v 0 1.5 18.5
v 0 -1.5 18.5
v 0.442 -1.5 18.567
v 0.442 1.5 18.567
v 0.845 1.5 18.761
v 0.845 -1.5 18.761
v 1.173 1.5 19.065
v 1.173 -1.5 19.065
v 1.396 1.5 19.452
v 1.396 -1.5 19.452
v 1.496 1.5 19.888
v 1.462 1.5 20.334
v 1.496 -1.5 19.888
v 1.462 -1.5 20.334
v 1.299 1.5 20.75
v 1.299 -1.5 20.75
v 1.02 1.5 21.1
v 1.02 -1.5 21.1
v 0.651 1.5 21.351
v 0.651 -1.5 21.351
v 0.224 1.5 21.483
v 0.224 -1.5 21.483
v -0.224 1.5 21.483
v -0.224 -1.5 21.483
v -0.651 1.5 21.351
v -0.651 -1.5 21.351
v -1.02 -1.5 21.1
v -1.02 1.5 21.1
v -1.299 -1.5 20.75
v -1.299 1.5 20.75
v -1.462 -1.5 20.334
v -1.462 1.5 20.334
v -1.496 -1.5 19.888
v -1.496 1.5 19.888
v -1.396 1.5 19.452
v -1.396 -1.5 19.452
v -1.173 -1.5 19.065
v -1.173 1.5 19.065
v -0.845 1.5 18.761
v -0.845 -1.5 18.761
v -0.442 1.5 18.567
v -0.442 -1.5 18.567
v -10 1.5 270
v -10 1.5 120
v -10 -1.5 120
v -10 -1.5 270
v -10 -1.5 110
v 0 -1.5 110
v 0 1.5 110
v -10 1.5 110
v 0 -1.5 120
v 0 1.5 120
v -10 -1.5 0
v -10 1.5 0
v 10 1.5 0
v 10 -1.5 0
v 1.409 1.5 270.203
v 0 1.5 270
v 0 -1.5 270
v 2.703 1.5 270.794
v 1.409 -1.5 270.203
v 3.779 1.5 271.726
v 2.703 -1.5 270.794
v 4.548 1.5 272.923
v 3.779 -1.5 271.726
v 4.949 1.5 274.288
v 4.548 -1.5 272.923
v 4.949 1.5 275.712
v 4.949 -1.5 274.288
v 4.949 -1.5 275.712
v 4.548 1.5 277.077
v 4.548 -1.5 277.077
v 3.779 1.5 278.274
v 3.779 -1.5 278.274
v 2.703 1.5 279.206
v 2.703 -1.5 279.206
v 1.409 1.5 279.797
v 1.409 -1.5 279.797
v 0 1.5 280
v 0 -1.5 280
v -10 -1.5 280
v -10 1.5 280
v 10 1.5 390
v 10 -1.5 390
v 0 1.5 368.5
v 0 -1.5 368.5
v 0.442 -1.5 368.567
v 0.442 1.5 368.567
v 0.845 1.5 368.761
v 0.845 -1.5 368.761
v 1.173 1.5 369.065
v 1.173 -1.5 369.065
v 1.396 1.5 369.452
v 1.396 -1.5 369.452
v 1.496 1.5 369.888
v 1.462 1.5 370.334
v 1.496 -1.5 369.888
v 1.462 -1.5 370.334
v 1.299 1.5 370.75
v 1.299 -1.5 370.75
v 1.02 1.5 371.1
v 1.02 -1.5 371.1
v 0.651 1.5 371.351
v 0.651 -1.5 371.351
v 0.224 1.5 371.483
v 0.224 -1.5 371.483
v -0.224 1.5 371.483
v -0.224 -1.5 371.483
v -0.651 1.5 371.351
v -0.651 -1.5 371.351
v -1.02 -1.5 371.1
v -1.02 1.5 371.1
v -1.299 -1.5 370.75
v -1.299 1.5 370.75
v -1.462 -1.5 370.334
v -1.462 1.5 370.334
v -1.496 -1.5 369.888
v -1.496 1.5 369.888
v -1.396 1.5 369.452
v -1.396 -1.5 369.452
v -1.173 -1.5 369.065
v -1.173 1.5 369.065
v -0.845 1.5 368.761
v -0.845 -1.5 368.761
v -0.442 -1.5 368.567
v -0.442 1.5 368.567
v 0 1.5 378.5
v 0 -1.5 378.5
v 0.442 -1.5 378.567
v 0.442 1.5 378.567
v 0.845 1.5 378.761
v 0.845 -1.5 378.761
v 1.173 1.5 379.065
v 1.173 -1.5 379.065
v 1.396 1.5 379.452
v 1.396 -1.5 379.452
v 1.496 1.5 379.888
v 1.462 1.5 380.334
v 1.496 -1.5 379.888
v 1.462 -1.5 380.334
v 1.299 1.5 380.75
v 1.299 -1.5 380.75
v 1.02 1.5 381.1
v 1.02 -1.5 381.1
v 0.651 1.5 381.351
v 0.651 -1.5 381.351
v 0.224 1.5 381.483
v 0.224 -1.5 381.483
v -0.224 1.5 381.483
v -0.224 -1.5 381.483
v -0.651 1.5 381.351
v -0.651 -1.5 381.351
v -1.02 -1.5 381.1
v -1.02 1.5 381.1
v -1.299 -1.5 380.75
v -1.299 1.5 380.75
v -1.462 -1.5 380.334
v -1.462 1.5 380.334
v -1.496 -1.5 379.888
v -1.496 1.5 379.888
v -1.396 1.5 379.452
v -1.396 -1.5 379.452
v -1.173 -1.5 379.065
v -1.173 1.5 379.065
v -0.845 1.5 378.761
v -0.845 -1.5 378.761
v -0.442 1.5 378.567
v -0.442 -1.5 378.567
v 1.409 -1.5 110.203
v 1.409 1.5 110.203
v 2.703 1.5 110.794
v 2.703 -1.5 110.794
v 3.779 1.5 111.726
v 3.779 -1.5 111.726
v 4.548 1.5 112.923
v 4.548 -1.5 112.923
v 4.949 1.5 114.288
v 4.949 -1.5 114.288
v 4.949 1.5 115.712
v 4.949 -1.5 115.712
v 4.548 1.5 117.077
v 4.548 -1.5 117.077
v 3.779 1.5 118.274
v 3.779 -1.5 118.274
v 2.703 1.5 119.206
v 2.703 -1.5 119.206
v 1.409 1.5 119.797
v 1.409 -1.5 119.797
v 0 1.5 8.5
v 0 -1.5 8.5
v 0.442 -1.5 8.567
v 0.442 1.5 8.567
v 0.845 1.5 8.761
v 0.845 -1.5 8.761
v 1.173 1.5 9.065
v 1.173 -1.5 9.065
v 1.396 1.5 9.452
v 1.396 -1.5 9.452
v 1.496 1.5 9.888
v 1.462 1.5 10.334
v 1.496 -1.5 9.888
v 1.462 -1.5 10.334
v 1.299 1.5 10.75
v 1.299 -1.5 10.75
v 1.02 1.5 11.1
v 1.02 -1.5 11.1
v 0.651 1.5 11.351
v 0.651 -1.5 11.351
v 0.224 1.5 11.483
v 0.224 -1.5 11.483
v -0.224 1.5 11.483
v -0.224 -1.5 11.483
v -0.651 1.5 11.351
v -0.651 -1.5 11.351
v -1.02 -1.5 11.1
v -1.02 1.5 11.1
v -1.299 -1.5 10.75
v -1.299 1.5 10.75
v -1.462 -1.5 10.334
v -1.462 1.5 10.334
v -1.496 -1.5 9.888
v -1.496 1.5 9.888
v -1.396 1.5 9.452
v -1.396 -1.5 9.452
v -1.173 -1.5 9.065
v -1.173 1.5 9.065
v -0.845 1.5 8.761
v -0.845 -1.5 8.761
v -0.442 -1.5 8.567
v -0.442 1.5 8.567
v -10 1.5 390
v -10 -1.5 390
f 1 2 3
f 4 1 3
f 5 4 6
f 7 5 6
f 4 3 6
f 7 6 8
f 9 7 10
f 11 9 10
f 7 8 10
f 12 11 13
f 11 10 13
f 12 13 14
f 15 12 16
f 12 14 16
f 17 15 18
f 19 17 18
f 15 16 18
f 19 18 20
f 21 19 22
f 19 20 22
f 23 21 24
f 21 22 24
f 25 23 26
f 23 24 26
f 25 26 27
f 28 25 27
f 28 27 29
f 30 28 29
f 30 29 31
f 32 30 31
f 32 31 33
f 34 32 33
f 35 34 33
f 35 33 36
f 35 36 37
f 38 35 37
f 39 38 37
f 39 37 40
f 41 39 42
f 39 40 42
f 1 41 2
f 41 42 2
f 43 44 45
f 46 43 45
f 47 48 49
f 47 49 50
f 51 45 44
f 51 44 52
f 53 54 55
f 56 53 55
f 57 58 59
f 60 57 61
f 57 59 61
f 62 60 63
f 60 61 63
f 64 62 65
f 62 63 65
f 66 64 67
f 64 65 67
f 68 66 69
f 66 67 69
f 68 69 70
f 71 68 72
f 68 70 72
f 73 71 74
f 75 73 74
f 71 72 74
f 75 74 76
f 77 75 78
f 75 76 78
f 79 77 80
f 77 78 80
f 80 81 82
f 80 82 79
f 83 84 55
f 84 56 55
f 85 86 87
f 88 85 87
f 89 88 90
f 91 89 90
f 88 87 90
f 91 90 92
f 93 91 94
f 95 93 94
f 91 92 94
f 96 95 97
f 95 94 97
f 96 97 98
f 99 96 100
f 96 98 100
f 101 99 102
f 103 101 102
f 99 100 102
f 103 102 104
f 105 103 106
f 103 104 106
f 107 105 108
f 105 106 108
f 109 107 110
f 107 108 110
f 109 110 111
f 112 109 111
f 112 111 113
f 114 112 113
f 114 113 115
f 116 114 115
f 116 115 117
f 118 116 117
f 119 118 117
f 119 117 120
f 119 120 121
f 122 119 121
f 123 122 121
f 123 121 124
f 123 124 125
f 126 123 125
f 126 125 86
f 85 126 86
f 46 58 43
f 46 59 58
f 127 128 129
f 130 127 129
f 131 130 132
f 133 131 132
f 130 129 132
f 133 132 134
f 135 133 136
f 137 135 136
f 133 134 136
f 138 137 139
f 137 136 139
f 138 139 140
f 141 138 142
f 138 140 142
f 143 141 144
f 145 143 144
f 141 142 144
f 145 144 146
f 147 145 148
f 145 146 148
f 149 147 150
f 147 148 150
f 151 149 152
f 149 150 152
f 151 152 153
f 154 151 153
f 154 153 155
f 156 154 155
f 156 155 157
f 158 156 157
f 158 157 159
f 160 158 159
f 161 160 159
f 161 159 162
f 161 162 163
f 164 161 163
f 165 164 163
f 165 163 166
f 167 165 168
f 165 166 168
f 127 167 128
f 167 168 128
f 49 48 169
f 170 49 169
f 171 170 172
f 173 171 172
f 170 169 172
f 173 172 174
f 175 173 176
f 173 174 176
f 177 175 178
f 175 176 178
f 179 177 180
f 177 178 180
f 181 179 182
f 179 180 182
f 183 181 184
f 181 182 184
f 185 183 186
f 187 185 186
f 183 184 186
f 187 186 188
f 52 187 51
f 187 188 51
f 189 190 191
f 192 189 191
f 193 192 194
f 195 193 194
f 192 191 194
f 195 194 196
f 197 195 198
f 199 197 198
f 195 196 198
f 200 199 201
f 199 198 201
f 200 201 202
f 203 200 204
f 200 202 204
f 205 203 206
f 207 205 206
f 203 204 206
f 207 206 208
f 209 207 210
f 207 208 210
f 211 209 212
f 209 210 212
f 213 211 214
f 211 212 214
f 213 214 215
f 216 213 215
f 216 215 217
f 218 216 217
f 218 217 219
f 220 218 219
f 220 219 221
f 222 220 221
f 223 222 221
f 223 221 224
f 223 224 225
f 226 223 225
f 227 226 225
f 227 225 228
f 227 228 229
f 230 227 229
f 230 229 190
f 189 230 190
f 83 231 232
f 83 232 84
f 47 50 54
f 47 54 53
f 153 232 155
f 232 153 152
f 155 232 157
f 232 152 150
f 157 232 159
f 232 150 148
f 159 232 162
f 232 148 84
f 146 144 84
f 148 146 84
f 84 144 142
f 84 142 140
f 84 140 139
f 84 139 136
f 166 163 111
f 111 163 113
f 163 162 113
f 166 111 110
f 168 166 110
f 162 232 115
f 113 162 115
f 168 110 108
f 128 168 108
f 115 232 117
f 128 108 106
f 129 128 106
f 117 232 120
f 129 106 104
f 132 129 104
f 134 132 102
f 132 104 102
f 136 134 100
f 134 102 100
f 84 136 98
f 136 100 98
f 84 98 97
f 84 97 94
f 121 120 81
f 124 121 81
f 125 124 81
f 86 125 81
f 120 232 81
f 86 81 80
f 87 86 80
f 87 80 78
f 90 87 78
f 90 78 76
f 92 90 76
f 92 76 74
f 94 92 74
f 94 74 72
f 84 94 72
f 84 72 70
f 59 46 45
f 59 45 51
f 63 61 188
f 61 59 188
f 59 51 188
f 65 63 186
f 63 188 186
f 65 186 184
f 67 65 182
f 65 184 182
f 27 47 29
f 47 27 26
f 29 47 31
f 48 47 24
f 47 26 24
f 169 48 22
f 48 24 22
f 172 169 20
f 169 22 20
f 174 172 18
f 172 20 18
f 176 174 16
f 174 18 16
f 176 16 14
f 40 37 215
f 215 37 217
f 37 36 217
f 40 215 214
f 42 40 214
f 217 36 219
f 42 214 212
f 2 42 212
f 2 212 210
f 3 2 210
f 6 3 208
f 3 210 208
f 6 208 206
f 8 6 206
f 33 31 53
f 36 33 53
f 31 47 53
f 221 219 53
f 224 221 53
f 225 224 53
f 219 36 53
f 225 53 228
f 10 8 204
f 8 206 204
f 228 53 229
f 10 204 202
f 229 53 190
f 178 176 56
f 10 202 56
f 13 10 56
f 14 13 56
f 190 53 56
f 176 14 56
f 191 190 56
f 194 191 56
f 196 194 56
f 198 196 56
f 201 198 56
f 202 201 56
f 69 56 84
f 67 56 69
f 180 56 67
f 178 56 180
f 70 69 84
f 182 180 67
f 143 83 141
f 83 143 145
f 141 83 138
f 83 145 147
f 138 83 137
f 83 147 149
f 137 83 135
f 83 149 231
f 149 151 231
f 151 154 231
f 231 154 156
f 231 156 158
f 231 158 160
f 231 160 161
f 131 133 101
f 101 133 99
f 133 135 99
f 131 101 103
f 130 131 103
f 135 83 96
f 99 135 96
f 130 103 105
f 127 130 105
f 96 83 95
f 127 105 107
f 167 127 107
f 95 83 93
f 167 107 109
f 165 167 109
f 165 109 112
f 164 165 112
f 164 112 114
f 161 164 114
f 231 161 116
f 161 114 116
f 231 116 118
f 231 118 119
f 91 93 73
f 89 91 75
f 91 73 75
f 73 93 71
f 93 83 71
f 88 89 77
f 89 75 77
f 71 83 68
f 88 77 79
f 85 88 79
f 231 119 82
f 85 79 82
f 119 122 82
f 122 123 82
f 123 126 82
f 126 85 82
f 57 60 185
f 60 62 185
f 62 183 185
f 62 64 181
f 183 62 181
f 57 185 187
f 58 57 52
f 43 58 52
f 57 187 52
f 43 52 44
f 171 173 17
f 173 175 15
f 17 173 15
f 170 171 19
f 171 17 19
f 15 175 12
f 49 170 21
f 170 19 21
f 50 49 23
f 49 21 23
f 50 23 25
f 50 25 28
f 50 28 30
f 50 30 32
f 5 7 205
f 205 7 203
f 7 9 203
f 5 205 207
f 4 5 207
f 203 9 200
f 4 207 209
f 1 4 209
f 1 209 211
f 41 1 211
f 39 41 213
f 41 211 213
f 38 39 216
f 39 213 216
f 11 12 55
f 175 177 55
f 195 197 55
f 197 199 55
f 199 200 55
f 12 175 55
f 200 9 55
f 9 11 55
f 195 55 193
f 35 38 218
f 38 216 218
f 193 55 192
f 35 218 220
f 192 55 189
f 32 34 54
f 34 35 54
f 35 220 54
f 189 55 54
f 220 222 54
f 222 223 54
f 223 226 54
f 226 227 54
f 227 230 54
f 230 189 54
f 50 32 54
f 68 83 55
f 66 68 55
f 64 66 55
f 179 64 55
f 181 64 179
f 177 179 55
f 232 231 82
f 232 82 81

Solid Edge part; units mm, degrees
sketch "Sketch1" plane through (0, 0, 0) normal (0, 0, 1) x (1, 0, 0)
  line L0 (-10, -1.5) -> (10, -1.5)
  line L1 (10, -1.5) -> (10, 1.5)
  line L2 (10, 1.5) -> (-10, 1.5)
  line L3 (-10, 1.5) -> (-10, -1.5)
  dimension "D1" = 20
  dimension "D2" = 20
  dimension "D3" = 3
  dimension "D4" = 1.5
  dimension "D5" = 10
extrude "Protrusion1" add sketch "Sketch1" along normal blind 390
sketch "Sketch2" plane through (0, -1.5, 157.5) normal (0, -1, 0) x (0, 0, -1)
  circle A0 centre (-212.5, 0) radius 1.5
  circle A1 centre (137.5, 0) radius 1.5
  circle A2 centre (147.5, 0) radius 1.5
  circle A3 centre (-222.5, 0) radius 1.5
  dimension "D1" = 10
  dimension "D2" = 20
  dimension "D3" = 20
  dimension "D4" = 10
  dimension "D5" = 10
  dimension "D6" = 10
extrude "ExtrudedCutout_1" cut sketch "Sketch2" along normal mid plane 784.3163
sketch "Sketch3" plane through (0, -1.5, 157.5) normal (0, -1, 0) x (0, 0, -1)
  line L0 (-112.5, -10) -> (-122.5, -10)
  line L1 (-122.5, -10) -> (-122.5, 0)
  line L2 (-112.5, 0) -> (-112.5, -10)
  arc A0 (-122.5, 0) -> (-112.5, 0) centre (-117.5, 0) cw
  line L3 (47.5, 0) -> (47.5, -10)
  line L4 (47.5, -10) -> (37.5, -10)
  line L5 (37.5, -10) -> (37.5, 0)
  arc A1 (47.5, 0) -> (37.5, 0) centre (42.5, 0) ccw
  dimension "D1" = 10
  dimension "D2" = 10
  dimension "D3" = 150
  dimension "D4" = 110
  dimension "D5" = 110
extrude "ExtrudedCutout_2" cut sketch "Sketch3" against normal blind 359.7683
